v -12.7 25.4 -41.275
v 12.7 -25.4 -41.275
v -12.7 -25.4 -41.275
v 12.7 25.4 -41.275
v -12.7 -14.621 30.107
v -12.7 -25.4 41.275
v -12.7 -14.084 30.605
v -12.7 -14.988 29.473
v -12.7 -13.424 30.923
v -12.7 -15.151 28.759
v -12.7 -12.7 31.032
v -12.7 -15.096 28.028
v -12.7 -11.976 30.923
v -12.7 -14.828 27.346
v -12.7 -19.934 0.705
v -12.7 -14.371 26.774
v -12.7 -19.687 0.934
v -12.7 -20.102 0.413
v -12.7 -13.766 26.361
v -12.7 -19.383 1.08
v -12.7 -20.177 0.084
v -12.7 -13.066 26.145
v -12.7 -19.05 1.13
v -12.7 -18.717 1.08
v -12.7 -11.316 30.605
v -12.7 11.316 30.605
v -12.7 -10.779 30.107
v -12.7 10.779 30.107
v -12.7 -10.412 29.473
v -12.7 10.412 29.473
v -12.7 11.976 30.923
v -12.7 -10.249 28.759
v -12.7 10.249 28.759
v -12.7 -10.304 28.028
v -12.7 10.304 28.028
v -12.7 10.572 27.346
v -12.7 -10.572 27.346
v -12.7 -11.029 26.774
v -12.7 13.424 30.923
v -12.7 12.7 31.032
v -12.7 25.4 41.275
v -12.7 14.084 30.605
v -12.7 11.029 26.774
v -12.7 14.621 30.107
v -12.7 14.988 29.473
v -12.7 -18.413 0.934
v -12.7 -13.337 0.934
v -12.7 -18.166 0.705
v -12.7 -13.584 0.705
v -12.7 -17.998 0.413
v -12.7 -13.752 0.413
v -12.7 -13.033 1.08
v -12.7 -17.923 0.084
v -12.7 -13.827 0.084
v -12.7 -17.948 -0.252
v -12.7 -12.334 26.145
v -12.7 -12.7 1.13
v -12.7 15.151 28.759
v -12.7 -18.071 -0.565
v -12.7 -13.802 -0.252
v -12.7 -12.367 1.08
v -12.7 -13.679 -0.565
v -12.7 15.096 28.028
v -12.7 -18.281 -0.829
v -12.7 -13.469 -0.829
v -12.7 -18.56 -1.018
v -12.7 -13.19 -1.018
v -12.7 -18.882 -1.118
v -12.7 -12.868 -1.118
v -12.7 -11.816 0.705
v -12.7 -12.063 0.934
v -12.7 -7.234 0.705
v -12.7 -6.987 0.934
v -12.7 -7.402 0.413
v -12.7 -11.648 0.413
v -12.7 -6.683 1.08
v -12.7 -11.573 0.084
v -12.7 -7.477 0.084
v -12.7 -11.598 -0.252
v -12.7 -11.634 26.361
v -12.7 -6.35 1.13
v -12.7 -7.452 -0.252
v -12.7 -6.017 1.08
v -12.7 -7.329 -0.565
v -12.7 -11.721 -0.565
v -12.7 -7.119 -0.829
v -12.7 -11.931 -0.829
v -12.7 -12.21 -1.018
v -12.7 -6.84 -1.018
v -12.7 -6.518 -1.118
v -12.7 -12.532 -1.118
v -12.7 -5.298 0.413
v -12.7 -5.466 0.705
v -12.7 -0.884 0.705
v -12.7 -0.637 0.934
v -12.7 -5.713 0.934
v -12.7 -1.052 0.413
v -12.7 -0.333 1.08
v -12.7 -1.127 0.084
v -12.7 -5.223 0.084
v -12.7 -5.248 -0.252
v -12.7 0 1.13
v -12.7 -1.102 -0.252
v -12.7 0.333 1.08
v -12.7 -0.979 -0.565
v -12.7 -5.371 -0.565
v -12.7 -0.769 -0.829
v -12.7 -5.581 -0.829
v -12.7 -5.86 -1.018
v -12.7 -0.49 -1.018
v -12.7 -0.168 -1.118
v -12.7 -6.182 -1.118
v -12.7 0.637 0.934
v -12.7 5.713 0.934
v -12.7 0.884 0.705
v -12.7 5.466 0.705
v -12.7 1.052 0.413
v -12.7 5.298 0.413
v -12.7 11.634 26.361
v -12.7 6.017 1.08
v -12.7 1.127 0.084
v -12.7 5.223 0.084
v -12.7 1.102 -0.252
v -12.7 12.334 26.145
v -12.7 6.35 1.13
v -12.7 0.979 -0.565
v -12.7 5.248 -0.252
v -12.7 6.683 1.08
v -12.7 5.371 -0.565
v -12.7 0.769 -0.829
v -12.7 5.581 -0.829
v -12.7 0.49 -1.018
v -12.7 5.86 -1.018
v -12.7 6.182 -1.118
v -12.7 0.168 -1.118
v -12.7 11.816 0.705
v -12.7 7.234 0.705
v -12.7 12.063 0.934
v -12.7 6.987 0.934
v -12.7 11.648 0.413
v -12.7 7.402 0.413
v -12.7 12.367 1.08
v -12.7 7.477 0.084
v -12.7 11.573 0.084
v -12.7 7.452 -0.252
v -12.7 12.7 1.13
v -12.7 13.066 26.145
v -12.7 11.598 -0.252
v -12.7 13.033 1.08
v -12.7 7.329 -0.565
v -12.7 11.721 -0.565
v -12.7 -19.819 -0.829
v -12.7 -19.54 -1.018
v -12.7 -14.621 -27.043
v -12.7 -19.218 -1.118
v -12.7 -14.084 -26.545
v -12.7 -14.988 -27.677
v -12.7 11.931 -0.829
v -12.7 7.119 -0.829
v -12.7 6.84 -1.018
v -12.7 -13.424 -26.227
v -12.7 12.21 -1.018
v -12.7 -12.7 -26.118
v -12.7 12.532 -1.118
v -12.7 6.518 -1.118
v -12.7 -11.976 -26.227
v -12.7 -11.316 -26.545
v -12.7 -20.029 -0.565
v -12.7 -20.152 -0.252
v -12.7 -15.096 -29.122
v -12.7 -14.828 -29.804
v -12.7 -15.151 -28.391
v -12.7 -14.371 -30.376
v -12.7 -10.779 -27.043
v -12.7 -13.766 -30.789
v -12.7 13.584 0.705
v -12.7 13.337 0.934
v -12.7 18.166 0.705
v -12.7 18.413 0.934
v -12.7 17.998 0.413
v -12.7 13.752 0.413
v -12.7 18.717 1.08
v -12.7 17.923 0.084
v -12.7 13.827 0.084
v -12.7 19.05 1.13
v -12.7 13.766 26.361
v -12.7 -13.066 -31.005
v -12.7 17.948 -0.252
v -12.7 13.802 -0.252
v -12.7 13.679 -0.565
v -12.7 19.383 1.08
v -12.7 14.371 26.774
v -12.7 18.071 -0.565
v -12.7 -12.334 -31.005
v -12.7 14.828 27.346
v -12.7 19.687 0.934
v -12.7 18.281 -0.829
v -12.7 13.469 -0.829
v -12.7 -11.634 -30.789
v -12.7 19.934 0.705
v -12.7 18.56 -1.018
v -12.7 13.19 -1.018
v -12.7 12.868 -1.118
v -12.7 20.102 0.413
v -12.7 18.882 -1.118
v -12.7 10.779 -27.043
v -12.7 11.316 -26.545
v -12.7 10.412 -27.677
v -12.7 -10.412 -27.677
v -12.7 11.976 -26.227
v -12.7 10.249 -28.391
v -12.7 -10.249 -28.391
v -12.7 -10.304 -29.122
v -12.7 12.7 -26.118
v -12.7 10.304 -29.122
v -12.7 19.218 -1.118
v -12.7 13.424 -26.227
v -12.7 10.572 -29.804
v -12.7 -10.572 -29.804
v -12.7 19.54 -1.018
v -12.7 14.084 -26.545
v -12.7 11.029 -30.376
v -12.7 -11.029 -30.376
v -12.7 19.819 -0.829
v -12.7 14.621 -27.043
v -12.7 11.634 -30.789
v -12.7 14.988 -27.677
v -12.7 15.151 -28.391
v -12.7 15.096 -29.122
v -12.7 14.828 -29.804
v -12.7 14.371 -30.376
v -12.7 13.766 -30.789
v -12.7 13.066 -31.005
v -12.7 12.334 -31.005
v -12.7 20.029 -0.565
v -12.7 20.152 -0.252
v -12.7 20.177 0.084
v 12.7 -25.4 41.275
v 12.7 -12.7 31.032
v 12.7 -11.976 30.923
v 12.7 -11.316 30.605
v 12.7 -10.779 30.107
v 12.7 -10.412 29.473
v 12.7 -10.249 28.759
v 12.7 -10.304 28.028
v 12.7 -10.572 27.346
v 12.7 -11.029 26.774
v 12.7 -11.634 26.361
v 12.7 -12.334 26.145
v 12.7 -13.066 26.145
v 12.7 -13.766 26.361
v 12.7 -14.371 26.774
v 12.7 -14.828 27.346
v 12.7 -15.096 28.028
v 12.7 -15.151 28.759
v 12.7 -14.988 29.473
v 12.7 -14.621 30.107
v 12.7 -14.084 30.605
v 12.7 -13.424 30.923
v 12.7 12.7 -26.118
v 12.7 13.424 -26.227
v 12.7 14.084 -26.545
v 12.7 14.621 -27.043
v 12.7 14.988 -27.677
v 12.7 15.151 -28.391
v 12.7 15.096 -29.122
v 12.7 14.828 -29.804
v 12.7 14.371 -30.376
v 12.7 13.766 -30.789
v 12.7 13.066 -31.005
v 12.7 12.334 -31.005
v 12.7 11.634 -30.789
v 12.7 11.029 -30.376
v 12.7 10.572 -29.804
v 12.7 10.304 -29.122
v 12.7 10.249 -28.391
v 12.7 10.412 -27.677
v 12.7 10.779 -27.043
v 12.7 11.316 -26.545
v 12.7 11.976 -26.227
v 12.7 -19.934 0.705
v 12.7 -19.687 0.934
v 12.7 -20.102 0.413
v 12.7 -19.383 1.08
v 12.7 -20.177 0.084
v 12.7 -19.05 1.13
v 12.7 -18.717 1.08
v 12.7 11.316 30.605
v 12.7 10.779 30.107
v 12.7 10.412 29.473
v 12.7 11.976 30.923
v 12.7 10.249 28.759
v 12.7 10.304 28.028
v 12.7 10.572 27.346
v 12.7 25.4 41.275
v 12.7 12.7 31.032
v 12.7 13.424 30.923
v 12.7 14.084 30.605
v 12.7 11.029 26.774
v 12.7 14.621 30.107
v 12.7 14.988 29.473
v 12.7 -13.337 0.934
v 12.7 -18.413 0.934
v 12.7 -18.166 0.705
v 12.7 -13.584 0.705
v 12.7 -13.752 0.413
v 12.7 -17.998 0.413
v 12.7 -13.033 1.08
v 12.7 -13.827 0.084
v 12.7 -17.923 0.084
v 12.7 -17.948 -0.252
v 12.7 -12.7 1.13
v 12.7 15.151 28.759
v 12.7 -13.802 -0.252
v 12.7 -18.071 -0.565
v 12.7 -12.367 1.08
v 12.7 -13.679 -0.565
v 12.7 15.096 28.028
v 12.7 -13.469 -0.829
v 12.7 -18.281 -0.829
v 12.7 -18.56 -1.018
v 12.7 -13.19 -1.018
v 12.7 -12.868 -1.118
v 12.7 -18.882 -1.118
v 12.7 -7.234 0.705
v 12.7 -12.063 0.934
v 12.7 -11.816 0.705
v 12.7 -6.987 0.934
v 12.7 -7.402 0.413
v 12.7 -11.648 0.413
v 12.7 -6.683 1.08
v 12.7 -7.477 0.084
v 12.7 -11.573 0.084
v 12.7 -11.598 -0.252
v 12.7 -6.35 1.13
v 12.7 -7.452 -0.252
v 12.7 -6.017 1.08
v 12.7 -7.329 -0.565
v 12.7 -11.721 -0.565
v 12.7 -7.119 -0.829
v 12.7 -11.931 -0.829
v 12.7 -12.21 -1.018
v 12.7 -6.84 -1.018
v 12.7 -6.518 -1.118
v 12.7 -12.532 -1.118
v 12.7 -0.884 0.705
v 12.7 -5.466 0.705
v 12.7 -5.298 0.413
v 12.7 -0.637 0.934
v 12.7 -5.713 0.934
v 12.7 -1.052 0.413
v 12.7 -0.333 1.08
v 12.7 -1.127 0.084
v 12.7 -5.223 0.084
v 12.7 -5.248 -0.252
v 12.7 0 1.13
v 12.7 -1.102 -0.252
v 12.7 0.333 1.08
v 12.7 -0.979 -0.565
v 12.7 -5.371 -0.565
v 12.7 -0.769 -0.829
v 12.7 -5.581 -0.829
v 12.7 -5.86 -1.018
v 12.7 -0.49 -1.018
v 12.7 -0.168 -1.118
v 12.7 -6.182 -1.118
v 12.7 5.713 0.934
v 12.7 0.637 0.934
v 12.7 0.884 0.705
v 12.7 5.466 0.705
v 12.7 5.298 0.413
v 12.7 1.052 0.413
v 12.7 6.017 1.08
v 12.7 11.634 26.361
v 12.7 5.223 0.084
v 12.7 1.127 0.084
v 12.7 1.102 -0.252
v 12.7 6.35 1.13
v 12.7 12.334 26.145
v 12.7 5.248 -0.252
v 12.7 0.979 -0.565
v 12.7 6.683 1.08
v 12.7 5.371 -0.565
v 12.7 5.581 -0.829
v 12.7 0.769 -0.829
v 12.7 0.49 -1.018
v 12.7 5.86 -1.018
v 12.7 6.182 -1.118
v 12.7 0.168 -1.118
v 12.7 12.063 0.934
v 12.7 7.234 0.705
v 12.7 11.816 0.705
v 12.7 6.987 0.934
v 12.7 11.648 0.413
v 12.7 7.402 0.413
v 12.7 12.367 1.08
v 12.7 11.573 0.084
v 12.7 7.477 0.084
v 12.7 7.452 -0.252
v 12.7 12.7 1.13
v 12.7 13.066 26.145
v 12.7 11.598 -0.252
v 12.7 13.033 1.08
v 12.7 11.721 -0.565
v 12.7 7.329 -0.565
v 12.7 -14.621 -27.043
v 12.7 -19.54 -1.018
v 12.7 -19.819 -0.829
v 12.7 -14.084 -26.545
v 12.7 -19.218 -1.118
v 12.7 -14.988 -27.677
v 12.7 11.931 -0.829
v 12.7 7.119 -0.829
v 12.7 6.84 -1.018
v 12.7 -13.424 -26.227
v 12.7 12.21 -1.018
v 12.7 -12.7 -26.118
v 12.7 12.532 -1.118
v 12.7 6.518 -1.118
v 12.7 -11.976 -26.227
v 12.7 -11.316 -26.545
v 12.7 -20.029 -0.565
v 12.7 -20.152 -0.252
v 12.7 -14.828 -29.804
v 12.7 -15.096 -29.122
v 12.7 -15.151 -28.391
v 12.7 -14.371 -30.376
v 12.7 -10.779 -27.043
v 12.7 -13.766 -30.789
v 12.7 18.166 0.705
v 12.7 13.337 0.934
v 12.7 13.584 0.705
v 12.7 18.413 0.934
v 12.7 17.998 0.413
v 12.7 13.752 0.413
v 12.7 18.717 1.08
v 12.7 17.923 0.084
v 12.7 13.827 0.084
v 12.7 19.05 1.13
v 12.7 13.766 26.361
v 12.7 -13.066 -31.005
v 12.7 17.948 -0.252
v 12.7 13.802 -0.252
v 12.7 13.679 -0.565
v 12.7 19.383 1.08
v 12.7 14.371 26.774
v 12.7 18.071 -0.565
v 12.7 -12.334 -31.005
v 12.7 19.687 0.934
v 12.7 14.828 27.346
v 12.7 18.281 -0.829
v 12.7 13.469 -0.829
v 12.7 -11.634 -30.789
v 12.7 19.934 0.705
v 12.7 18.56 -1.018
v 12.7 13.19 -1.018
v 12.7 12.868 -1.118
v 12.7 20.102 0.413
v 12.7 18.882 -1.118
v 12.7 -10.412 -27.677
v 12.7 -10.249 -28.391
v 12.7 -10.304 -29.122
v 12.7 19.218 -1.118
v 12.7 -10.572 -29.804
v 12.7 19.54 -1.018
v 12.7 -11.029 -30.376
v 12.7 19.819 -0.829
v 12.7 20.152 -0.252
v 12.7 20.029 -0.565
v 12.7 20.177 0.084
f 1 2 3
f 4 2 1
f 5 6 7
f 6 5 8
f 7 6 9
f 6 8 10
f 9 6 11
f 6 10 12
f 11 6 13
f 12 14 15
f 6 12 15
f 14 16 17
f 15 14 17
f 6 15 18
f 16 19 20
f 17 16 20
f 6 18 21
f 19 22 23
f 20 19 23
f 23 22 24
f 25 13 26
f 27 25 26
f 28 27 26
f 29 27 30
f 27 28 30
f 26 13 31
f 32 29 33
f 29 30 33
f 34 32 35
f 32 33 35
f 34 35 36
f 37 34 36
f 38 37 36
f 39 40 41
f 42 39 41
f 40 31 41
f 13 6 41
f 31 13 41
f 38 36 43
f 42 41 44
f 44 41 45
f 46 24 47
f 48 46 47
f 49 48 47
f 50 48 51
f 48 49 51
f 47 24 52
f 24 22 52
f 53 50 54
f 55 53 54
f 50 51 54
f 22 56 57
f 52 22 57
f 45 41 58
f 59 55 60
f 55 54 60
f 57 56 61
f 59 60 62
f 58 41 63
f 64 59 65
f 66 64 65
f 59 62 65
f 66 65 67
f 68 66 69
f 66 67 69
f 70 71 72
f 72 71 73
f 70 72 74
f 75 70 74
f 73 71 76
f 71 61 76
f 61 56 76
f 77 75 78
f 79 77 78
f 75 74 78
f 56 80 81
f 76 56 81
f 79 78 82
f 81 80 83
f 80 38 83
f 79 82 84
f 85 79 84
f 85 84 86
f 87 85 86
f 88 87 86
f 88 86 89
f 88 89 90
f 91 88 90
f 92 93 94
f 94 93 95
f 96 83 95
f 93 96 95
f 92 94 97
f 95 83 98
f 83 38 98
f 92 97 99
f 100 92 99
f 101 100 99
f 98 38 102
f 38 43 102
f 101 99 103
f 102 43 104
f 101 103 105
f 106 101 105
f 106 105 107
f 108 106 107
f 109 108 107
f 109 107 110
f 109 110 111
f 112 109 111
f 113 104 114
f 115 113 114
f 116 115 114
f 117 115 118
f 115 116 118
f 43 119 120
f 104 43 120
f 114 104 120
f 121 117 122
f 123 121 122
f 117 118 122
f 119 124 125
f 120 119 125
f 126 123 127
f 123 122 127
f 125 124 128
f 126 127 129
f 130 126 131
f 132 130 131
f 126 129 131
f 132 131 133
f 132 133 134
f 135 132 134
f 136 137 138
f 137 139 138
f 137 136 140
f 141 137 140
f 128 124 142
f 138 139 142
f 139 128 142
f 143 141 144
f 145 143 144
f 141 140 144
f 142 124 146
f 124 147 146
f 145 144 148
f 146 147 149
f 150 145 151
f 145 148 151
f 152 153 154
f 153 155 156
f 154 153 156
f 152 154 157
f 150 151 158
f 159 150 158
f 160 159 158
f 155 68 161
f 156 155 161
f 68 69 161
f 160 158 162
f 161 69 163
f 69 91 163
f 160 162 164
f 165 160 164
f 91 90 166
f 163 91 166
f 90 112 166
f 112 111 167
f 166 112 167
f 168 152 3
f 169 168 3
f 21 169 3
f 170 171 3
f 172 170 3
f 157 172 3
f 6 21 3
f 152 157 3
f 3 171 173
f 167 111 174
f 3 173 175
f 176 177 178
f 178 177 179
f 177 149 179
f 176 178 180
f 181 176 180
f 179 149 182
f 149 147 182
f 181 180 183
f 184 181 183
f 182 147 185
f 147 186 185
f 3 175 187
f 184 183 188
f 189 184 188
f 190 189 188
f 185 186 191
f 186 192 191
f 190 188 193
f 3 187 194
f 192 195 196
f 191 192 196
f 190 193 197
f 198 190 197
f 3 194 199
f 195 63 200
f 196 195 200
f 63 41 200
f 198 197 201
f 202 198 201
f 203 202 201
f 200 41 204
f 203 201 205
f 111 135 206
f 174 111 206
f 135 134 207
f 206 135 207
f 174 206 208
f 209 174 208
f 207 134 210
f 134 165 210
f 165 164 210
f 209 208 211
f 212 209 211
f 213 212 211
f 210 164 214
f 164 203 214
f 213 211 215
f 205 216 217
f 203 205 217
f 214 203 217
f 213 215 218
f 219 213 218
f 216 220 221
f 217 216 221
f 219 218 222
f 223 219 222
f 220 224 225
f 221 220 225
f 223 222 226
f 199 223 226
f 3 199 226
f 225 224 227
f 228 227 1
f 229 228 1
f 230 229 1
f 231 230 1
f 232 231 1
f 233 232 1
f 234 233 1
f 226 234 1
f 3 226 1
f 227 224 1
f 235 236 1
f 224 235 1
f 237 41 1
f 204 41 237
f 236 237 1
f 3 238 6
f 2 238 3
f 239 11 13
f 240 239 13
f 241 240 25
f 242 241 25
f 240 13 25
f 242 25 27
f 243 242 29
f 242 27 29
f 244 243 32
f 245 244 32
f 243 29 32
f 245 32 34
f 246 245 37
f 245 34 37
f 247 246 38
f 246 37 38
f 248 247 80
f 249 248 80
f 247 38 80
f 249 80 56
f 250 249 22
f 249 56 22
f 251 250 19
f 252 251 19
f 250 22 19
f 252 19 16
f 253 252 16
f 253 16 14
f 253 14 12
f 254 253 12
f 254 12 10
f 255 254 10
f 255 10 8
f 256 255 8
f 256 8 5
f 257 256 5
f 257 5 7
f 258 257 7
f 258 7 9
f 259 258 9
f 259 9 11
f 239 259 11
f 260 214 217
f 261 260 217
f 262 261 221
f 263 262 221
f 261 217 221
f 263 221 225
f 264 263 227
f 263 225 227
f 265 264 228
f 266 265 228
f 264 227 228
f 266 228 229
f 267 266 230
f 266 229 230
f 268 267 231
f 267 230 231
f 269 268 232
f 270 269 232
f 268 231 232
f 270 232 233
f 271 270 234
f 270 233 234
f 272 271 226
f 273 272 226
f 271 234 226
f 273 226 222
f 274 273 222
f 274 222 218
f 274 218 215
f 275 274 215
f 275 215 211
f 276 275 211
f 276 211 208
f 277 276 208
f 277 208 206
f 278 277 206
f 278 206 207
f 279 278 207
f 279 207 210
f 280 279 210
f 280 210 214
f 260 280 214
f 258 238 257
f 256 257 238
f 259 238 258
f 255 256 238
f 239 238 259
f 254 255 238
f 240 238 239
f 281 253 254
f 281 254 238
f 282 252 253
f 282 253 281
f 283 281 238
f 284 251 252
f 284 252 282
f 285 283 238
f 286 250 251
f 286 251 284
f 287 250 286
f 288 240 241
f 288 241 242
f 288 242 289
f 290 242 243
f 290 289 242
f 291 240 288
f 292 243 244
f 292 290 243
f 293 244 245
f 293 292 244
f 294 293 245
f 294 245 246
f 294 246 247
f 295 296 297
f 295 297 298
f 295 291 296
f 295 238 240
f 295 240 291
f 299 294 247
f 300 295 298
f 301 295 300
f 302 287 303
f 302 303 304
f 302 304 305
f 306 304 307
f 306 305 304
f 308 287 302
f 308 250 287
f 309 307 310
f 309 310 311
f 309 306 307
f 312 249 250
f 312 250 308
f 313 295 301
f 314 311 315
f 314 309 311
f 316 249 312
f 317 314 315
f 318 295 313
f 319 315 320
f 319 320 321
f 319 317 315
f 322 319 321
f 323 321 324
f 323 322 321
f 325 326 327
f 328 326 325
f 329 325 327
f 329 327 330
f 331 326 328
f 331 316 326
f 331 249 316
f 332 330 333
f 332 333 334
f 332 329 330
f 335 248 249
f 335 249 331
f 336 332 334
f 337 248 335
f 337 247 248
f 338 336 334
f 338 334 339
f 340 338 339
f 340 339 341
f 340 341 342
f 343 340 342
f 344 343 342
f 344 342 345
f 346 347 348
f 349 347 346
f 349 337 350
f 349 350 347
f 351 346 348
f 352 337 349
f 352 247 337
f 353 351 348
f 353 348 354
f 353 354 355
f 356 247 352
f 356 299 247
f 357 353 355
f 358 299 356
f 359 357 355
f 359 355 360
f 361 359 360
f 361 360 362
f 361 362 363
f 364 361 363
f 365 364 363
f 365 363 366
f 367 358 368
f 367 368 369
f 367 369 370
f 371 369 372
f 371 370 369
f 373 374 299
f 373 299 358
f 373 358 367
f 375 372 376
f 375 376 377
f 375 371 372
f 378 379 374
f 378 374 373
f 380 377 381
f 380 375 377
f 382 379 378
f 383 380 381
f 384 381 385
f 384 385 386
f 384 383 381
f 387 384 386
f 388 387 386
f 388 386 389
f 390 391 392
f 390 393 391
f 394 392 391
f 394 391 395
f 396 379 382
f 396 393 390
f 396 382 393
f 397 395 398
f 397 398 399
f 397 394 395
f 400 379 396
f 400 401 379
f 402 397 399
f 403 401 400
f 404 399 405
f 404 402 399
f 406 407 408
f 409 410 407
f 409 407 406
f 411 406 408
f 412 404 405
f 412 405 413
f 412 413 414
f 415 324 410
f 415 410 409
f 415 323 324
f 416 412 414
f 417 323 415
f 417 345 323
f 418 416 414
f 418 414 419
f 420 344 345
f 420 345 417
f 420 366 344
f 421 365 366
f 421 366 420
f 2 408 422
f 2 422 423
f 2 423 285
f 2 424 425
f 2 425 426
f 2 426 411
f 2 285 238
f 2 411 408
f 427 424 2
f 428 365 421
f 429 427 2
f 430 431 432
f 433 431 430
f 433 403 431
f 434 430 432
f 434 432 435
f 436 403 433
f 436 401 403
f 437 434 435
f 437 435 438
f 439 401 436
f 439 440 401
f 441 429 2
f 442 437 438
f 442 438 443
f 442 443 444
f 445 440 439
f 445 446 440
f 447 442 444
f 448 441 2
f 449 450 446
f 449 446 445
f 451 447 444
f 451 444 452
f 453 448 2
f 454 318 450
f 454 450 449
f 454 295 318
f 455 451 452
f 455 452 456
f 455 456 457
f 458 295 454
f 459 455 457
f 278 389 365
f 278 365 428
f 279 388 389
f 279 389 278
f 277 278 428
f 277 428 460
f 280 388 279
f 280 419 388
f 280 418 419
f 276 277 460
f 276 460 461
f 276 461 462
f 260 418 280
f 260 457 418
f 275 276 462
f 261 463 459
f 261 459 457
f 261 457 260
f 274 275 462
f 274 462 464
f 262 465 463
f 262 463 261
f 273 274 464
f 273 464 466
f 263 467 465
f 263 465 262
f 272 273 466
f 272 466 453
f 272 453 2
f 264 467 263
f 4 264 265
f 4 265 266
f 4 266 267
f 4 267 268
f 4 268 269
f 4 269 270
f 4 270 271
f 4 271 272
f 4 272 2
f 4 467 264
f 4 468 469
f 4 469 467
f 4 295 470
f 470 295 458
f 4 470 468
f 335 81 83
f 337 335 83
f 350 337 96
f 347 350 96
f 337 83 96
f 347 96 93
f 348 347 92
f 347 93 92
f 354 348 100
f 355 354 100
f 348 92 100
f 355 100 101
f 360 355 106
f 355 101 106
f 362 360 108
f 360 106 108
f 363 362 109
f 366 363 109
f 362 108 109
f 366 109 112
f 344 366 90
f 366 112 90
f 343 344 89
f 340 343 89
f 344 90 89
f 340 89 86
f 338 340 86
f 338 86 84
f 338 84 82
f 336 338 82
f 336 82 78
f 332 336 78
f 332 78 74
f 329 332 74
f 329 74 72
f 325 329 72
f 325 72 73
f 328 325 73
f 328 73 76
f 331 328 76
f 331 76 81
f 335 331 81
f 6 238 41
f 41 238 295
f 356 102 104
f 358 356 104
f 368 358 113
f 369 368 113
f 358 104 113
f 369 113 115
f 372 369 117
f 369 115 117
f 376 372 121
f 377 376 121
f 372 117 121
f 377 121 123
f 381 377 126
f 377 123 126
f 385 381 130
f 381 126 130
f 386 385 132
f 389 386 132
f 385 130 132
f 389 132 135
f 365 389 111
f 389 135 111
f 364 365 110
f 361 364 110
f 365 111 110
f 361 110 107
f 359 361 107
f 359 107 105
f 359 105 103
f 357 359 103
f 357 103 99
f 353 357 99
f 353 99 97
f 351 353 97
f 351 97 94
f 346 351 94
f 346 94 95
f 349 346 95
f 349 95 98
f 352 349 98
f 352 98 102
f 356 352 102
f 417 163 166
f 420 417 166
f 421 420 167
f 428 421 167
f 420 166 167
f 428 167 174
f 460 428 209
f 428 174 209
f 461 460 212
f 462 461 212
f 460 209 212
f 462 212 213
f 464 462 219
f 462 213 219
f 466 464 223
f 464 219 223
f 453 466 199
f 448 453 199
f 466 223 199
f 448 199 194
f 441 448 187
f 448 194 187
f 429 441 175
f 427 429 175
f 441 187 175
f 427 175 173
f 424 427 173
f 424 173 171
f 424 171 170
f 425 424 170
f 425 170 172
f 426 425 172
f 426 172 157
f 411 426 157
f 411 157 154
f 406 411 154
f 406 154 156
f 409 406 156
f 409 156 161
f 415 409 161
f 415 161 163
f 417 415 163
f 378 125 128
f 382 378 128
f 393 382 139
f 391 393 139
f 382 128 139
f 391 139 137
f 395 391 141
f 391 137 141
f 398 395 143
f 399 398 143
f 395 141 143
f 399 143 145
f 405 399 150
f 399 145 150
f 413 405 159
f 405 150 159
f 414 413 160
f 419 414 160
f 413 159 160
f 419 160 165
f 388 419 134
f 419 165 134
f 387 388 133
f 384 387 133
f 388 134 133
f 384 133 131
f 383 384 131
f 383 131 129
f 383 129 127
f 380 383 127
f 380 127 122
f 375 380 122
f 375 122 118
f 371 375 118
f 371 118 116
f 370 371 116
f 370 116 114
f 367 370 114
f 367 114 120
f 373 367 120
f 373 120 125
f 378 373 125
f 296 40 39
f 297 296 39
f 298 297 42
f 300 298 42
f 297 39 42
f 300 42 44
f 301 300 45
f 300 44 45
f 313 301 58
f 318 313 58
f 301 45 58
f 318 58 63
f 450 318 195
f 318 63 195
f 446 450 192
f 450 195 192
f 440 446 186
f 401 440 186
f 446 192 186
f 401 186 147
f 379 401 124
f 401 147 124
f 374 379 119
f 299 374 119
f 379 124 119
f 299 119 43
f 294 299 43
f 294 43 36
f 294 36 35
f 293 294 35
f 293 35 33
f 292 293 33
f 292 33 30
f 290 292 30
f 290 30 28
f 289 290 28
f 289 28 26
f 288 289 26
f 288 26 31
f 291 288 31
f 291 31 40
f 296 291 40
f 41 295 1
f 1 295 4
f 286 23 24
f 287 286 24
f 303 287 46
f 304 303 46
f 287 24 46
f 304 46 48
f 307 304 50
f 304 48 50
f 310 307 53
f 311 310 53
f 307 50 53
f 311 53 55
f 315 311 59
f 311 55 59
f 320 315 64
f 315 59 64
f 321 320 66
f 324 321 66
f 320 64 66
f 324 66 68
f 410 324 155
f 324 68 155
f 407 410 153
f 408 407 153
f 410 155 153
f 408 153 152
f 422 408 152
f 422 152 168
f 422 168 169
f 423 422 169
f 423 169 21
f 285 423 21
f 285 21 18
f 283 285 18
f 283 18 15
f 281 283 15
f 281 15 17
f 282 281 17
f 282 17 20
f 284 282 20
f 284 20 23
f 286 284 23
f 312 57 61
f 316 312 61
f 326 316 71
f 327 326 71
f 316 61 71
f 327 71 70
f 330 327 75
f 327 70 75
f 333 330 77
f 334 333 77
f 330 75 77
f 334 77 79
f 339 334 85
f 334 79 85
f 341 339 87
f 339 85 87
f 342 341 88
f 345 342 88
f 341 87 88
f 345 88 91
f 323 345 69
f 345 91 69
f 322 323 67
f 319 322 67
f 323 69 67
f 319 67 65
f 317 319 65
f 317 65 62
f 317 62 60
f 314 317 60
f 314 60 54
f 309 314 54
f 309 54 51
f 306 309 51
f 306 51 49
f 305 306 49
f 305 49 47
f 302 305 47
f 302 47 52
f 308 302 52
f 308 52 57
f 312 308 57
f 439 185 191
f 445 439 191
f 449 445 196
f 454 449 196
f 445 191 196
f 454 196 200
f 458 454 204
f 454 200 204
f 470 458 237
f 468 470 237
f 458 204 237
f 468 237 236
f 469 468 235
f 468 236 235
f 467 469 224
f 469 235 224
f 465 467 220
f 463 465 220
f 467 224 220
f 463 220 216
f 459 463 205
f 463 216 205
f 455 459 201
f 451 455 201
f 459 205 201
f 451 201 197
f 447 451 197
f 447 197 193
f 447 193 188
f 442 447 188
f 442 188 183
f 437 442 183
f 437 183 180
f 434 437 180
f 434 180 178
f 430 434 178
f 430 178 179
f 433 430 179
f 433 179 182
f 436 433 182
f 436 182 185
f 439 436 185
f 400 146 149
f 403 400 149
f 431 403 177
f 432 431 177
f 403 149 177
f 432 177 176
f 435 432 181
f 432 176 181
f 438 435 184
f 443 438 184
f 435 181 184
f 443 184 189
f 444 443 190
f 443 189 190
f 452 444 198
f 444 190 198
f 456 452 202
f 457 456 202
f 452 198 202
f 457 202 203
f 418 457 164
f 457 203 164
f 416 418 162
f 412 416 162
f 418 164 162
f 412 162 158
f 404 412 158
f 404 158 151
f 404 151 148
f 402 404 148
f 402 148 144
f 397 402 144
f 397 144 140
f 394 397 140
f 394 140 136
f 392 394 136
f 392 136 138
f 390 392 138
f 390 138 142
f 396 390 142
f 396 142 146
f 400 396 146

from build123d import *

# Parameters (mm, degrees)
SKETCH1_W                    = 82.55
SKETCH1_H                    = 50.8
BOSS_EXTRUDE1_DEPTH          = 12.7
F_10_0_1935_DIAMETER_HOLE1_D = 4.9149
F_4_40_TAPPED_HOLE1_D        = 2.2606


with BuildPart() as part:
    # Sketch1 → Boss-Extrude1 (new, symmetric)
    with BuildSketch(Plane(origin=(0, 0, 0), x_dir=(0, 0, -1), z_dir=(1, 0, 0))):
        Rectangle(SKETCH1_W, SKETCH1_H)
    extrude(amount=BOSS_EXTRUDE1_DEPTH, both=True)

    # #10 (0.1935) Diameter Hole1 (through all)
    with Locations(Plane(origin=(12.7, 0, 0), x_dir=(0, 0, -1), z_dir=(1, 0, 0))):
        with Locations((28.575, 12.7), (-28.575, 12.7), (-28.575, -12.7), (28.575, -12.7)):
            Hole(F_10_0_1935_DIAMETER_HOLE1_D / 2)

    # #4-40 Tapped Hole1 (through all)
    with Locations(Plane(origin=(12.7, 0, 0), x_dir=(0, 0, -1), z_dir=(1, 0, 0))):
        with Locations((0, 19.05), (0, 12.7), (0, 6.35), (0, 0), (0, -6.35), (0, -12.7), (0, -19.05)):
            Hole(F_4_40_TAPPED_HOLE1_D / 2)


solid = part.part
